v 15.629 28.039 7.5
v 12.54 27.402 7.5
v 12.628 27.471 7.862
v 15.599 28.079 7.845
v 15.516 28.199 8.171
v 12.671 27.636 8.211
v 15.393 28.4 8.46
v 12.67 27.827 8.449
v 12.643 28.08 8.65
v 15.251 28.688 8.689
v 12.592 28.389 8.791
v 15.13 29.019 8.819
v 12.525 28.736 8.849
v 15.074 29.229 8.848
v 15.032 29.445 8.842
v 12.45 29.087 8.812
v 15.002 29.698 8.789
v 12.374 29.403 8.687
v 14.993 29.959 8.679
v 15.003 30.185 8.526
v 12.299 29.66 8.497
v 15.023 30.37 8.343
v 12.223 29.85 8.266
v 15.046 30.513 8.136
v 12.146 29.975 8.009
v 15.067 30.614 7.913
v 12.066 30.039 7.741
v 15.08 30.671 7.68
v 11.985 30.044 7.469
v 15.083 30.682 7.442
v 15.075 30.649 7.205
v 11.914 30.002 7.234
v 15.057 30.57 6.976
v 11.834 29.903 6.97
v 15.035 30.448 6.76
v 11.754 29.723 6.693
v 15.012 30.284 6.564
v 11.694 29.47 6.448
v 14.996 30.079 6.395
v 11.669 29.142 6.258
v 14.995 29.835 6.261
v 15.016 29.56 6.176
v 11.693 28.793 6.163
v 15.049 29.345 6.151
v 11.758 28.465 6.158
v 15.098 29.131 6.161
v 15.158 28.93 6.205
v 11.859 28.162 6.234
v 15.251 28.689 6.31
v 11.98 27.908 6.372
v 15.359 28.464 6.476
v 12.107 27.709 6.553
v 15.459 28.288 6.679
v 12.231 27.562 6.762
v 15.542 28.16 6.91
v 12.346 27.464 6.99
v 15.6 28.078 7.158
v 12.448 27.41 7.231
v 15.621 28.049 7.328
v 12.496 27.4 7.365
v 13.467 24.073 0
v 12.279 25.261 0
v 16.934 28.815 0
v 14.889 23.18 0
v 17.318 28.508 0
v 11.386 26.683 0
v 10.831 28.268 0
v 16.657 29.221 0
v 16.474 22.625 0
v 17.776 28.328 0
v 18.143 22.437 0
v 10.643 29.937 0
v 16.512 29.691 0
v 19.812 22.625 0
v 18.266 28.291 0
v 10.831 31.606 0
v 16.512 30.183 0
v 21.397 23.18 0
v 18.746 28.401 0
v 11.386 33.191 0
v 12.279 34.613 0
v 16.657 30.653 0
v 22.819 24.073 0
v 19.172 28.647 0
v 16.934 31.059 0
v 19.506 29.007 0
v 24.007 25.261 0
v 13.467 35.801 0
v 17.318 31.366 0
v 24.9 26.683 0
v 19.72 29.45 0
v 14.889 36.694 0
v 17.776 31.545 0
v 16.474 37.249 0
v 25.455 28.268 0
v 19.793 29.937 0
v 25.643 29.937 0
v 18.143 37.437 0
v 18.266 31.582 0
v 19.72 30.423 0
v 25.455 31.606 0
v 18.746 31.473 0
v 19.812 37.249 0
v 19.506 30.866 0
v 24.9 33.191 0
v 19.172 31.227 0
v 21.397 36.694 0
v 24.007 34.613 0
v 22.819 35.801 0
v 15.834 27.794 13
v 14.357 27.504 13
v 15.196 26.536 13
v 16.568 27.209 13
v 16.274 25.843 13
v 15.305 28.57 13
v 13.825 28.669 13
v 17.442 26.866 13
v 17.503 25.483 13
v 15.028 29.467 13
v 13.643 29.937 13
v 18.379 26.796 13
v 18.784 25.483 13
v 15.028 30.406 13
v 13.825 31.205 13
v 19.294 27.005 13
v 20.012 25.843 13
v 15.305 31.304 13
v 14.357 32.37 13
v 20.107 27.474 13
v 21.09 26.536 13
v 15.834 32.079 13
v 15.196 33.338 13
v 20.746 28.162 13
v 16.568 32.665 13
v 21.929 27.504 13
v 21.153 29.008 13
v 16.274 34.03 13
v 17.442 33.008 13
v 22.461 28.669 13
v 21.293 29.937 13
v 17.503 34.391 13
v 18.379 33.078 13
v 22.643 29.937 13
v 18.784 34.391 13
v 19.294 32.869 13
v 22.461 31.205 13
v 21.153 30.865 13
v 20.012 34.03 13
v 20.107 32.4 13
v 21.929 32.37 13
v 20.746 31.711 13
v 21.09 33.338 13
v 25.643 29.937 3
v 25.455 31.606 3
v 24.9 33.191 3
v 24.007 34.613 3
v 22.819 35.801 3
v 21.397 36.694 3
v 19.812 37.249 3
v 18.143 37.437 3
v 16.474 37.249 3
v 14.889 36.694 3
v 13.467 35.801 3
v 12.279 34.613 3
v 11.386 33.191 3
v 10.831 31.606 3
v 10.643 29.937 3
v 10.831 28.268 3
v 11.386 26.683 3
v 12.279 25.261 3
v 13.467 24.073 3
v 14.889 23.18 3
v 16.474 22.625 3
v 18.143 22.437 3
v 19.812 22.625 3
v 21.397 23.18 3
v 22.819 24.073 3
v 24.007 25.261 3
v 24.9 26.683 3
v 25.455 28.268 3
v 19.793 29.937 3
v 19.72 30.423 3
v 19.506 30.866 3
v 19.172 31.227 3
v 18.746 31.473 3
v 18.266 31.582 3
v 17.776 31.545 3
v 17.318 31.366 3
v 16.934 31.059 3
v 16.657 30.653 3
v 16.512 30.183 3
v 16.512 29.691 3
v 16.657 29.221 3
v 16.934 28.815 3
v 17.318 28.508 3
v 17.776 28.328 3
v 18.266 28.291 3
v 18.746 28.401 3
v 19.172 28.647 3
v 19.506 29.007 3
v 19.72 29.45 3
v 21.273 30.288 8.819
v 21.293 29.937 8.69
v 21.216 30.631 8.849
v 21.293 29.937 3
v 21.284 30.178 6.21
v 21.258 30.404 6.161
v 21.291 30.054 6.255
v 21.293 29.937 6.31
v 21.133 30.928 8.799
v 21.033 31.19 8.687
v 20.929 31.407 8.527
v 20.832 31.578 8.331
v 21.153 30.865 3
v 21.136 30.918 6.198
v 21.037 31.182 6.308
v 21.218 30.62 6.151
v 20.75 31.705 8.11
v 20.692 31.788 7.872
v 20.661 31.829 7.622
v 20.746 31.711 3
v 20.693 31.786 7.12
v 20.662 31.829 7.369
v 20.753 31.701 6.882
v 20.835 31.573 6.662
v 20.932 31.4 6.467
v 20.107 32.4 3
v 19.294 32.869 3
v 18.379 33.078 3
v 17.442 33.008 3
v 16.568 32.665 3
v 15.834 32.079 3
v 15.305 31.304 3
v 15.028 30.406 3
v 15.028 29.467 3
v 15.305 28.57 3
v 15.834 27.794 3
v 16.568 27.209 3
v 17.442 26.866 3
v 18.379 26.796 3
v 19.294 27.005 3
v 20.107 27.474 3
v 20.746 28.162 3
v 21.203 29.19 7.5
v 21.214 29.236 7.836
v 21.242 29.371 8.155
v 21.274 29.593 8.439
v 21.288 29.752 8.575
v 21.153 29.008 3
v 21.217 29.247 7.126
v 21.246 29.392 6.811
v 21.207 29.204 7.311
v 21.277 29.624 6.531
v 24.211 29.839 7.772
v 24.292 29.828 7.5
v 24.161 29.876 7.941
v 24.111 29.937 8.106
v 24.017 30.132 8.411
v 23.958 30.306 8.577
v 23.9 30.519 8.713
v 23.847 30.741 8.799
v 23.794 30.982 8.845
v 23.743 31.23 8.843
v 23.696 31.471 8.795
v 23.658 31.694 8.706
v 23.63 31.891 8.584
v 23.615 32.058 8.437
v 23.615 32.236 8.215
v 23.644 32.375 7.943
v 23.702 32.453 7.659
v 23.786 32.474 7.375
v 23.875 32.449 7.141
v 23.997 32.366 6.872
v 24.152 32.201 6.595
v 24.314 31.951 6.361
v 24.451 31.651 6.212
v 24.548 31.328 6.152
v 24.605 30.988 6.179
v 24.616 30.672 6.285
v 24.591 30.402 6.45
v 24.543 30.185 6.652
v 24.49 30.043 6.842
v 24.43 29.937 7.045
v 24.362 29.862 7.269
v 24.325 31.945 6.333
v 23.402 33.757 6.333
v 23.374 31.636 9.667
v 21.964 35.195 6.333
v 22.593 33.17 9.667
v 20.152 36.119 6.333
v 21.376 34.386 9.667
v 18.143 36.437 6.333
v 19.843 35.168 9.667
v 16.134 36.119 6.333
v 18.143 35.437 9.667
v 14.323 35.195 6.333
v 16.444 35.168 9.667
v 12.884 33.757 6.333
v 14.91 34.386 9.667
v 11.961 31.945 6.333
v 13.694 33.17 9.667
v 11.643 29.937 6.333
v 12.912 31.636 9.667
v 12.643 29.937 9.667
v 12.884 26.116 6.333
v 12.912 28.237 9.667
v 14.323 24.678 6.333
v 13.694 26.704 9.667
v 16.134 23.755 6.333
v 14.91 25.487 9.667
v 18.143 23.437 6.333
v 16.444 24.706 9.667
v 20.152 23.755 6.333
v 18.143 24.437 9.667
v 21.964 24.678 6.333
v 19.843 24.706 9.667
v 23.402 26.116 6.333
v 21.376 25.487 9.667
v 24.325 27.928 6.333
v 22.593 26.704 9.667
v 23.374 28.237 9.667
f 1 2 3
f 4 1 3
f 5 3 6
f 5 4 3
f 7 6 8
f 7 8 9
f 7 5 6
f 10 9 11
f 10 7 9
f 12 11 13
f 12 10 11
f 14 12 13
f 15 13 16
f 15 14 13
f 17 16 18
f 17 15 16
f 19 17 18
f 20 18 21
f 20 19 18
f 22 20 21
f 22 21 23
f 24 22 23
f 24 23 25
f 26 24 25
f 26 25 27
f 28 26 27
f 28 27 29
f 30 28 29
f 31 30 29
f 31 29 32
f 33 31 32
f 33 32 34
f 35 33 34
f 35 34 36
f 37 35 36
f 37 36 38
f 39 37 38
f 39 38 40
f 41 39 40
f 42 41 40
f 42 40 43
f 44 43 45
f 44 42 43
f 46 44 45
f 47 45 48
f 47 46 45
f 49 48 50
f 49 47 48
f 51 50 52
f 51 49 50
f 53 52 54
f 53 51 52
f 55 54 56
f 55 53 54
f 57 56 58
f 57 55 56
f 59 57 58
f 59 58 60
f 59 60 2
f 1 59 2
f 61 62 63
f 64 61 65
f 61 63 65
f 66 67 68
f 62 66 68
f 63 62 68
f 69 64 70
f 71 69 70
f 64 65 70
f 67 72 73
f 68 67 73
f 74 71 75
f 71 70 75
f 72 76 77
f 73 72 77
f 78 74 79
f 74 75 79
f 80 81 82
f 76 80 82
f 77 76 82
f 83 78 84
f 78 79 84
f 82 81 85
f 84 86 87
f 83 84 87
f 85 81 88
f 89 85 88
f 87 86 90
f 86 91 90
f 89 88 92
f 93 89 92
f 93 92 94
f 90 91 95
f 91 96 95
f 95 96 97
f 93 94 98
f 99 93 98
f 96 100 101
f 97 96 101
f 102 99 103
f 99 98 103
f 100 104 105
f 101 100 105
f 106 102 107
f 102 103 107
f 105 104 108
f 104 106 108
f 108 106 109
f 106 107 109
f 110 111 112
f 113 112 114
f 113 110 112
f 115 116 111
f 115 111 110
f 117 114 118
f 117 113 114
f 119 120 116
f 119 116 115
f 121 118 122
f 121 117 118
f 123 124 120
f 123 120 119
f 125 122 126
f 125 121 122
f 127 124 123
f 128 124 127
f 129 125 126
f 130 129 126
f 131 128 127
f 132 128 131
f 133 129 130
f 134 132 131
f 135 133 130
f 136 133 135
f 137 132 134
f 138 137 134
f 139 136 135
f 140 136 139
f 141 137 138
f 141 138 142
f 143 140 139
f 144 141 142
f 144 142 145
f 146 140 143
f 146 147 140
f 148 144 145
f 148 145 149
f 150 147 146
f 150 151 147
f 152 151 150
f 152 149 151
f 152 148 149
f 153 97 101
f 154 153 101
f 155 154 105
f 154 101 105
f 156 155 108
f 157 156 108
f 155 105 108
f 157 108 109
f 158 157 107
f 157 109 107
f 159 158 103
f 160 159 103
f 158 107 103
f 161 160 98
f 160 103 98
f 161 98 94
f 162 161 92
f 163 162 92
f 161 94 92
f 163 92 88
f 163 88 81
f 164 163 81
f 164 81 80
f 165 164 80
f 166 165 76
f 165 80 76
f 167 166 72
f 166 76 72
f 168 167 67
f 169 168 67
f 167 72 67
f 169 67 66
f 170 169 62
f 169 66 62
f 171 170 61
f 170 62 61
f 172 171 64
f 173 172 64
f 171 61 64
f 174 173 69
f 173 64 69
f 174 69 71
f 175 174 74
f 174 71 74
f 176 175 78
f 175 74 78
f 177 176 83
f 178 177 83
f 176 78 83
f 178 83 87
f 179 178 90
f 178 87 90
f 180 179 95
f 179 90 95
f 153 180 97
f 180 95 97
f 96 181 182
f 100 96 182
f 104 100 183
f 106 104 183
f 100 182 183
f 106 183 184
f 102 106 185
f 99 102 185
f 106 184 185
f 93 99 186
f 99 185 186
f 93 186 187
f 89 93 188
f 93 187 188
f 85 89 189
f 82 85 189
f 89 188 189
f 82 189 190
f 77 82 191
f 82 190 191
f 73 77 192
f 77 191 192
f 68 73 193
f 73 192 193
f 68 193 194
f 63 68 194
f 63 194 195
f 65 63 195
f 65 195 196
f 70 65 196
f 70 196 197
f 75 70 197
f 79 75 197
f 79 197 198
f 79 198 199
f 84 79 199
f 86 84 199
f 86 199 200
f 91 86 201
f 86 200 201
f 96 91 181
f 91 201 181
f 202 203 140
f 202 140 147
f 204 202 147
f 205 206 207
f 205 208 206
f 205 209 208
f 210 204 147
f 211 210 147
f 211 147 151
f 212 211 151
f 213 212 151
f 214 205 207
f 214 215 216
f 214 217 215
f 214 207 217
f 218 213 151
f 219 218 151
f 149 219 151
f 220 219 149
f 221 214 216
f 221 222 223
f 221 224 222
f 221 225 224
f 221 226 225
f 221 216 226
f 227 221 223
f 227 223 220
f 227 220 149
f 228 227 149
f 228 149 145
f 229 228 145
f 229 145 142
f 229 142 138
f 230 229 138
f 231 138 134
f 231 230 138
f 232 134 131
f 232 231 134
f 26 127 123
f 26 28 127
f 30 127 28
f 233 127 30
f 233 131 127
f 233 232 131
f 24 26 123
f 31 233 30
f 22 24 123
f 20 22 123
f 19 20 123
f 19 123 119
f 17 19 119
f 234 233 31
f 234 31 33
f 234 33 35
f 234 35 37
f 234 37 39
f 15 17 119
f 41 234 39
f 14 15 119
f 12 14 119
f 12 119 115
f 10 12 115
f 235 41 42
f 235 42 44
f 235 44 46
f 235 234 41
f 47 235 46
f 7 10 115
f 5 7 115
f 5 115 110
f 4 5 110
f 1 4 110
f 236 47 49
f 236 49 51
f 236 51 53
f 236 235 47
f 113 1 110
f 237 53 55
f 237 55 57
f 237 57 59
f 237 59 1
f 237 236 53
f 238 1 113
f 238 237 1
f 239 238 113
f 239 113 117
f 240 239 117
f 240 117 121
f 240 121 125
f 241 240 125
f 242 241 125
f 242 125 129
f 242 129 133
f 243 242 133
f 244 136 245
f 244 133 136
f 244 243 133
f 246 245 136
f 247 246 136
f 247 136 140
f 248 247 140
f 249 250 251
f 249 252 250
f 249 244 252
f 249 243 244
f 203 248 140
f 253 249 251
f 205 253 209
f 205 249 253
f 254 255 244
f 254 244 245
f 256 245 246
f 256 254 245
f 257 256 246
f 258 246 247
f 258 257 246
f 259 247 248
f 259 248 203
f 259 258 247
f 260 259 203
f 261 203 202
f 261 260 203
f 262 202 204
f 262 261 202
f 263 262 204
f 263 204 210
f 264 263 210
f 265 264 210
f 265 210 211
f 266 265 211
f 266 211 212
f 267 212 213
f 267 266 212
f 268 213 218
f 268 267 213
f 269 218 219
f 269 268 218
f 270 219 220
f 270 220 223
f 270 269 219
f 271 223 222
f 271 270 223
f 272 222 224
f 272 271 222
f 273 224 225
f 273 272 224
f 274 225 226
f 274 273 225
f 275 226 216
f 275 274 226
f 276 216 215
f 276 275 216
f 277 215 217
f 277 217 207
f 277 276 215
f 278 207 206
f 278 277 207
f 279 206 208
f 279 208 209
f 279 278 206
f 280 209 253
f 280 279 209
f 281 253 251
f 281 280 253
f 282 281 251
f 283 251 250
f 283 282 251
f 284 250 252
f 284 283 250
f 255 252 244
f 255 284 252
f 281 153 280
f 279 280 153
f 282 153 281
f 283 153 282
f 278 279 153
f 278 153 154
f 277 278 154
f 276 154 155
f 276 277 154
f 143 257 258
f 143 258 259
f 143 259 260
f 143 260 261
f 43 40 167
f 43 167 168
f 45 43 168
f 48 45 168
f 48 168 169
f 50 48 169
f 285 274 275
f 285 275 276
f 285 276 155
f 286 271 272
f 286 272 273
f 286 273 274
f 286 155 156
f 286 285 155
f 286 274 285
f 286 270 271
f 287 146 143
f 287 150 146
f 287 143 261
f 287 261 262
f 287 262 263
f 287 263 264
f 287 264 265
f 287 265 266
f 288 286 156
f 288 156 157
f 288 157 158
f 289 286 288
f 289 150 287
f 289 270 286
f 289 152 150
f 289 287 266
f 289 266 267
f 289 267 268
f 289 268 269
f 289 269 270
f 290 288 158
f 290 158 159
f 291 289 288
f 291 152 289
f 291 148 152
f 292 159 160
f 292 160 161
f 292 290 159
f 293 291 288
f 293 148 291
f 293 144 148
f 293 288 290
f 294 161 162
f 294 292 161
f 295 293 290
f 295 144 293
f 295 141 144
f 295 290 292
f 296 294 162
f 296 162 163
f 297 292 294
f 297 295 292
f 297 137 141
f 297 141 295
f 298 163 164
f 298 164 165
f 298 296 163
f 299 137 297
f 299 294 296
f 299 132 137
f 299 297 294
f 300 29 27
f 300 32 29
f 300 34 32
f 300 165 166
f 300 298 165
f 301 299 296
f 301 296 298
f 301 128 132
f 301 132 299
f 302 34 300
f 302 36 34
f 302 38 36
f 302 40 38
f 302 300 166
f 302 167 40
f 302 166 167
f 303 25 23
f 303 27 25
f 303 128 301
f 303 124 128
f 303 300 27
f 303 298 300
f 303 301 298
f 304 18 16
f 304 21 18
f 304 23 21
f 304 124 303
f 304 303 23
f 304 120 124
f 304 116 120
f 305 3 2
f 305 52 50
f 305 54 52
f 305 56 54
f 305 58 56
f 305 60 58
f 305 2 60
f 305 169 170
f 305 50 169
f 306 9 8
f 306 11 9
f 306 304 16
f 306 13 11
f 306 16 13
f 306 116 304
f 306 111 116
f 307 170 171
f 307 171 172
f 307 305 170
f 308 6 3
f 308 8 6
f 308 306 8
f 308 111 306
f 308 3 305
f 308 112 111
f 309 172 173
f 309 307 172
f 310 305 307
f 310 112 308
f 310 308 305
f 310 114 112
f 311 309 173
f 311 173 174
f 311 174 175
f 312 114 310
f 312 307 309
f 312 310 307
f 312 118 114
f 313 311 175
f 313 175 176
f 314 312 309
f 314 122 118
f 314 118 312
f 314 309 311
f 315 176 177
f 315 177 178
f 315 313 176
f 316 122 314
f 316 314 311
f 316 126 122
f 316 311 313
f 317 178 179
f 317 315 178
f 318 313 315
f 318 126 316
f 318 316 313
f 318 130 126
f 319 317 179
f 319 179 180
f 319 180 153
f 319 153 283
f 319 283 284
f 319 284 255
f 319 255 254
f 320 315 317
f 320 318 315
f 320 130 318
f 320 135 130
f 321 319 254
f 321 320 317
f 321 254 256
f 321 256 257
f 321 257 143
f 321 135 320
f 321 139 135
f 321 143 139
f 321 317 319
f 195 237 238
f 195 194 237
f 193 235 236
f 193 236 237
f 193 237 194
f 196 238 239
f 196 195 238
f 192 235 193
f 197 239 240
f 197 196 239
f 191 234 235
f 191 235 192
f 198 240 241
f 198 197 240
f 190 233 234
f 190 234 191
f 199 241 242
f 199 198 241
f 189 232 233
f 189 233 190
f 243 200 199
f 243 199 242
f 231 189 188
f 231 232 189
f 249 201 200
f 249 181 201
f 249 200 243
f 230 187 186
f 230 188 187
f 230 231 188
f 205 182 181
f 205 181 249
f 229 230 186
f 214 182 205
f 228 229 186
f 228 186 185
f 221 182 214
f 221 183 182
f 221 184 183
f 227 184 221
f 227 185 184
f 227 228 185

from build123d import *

# Parameters (mm, degrees)
SKETCH_6_R               = 7.5
EXTRUDE_1_DEPTH          = 3
SKETCH_7_R               = 4.5
SKETCH_7_R_2             = 3.15
EXTRUDE_2_DEPTH          = 10
SKETCH_9_R               = 1.65
CUT_EXTRUDE_1_DEPTH      = 3
CHAMFER_1_SIZE           = 3
CHAMFER_1_SIZE_2         = 10
CUT_EXTRUDE_2_DEPTH      = 37.903513147
CUT_EXTRUDE_2_DEPTH_BACK = 37.903513147
SKETCH_10_R              = 1.35


with BuildPart() as part:
    # 草图6 → 凸台-拉伸1 (new body)
    with BuildSketch(Plane.XY):
        with Locations((18.143108258, 29.936835998)):
            Circle(SKETCH_6_R)
    extrude(amount=EXTRUDE_1_DEPTH)

    # 草图7 → 凸台-拉伸2 (add)
    with BuildSketch(Plane.XY.offset(3)):
        with Locations((18.143108258, 29.936835998)):
            Circle(SKETCH_7_R)
        with Locations((18.143108258, 29.936835998)):
            Circle(SKETCH_7_R_2, mode=Mode.SUBTRACT)
    extrude(amount=EXTRUDE_2_DEPTH)

    # 草图9 → 切除-拉伸1 (cut)
    with BuildSketch(Plane.XY.offset(3)):
        with Locations((18.143108258, 29.936835998)):
            Circle(SKETCH_9_R)
    extrude(amount=-CUT_EXTRUDE_1_DEPTH, mode=Mode.SUBTRACT)

    # 倒角1
    # the kernel refuses this chamfer: 10, 3 mm, written as the material it adds along each edge
    with BuildSketch(Plane(origin=(18.143108258, 29.936835998, 3), x_dir=(1, 0, 0), z_dir=(0, -1, 0))) as chamfer_1_piece_1_section:
        Polygon((4.5 + CHAMFER_1_SIZE, 0), (4.5, CHAMFER_1_SIZE_2), (4.5, 0), align=None)
    chamfer_1_piece_1 = revolve(axis=Axis((18.143108258, 29.936835998, 3), (0, 0, 1)), mode=Mode.PRIVATE)
    chamfer_1_piece_1 = chamfer_1_piece_1 & Plane(origin=(18.143108258, 29.936835998, 7.975650117), x_dir=(1, 0, 0), z_dir=(0, 0, -1)) * Cylinder(7.5, 40, mode=Mode.PRIVATE)
    chamfer_1_piece_1 = split(chamfer_1_piece_1, bisect_by=Plane(origin=(12.224274533, 29.936835998, 13), z_dir=(0, 0, -1)), keep=Keep.TOP, mode=Mode.PRIVATE)
    add(chamfer_1_piece_1)

    # 草图10 → 切除-拉伸2 (cut, two sides: drawn at the far end of the back side and taken through both)
    with BuildSketch(Plane(origin=(18.921476442, 3.905687751, 0), x_dir=(0, 0, 1), z_dir=(-0.9793537694565077, -0.20215388754938593, 0)).offset(-CUT_EXTRUDE_2_DEPTH_BACK)):
        with Locations(Location((7.5, 25.651053313, 0), (0, 0, 270))):
            Circle(SKETCH_10_R)
    extrude(amount=CUT_EXTRUDE_2_DEPTH + CUT_EXTRUDE_2_DEPTH_BACK, mode=Mode.SUBTRACT)


solid = part.part
